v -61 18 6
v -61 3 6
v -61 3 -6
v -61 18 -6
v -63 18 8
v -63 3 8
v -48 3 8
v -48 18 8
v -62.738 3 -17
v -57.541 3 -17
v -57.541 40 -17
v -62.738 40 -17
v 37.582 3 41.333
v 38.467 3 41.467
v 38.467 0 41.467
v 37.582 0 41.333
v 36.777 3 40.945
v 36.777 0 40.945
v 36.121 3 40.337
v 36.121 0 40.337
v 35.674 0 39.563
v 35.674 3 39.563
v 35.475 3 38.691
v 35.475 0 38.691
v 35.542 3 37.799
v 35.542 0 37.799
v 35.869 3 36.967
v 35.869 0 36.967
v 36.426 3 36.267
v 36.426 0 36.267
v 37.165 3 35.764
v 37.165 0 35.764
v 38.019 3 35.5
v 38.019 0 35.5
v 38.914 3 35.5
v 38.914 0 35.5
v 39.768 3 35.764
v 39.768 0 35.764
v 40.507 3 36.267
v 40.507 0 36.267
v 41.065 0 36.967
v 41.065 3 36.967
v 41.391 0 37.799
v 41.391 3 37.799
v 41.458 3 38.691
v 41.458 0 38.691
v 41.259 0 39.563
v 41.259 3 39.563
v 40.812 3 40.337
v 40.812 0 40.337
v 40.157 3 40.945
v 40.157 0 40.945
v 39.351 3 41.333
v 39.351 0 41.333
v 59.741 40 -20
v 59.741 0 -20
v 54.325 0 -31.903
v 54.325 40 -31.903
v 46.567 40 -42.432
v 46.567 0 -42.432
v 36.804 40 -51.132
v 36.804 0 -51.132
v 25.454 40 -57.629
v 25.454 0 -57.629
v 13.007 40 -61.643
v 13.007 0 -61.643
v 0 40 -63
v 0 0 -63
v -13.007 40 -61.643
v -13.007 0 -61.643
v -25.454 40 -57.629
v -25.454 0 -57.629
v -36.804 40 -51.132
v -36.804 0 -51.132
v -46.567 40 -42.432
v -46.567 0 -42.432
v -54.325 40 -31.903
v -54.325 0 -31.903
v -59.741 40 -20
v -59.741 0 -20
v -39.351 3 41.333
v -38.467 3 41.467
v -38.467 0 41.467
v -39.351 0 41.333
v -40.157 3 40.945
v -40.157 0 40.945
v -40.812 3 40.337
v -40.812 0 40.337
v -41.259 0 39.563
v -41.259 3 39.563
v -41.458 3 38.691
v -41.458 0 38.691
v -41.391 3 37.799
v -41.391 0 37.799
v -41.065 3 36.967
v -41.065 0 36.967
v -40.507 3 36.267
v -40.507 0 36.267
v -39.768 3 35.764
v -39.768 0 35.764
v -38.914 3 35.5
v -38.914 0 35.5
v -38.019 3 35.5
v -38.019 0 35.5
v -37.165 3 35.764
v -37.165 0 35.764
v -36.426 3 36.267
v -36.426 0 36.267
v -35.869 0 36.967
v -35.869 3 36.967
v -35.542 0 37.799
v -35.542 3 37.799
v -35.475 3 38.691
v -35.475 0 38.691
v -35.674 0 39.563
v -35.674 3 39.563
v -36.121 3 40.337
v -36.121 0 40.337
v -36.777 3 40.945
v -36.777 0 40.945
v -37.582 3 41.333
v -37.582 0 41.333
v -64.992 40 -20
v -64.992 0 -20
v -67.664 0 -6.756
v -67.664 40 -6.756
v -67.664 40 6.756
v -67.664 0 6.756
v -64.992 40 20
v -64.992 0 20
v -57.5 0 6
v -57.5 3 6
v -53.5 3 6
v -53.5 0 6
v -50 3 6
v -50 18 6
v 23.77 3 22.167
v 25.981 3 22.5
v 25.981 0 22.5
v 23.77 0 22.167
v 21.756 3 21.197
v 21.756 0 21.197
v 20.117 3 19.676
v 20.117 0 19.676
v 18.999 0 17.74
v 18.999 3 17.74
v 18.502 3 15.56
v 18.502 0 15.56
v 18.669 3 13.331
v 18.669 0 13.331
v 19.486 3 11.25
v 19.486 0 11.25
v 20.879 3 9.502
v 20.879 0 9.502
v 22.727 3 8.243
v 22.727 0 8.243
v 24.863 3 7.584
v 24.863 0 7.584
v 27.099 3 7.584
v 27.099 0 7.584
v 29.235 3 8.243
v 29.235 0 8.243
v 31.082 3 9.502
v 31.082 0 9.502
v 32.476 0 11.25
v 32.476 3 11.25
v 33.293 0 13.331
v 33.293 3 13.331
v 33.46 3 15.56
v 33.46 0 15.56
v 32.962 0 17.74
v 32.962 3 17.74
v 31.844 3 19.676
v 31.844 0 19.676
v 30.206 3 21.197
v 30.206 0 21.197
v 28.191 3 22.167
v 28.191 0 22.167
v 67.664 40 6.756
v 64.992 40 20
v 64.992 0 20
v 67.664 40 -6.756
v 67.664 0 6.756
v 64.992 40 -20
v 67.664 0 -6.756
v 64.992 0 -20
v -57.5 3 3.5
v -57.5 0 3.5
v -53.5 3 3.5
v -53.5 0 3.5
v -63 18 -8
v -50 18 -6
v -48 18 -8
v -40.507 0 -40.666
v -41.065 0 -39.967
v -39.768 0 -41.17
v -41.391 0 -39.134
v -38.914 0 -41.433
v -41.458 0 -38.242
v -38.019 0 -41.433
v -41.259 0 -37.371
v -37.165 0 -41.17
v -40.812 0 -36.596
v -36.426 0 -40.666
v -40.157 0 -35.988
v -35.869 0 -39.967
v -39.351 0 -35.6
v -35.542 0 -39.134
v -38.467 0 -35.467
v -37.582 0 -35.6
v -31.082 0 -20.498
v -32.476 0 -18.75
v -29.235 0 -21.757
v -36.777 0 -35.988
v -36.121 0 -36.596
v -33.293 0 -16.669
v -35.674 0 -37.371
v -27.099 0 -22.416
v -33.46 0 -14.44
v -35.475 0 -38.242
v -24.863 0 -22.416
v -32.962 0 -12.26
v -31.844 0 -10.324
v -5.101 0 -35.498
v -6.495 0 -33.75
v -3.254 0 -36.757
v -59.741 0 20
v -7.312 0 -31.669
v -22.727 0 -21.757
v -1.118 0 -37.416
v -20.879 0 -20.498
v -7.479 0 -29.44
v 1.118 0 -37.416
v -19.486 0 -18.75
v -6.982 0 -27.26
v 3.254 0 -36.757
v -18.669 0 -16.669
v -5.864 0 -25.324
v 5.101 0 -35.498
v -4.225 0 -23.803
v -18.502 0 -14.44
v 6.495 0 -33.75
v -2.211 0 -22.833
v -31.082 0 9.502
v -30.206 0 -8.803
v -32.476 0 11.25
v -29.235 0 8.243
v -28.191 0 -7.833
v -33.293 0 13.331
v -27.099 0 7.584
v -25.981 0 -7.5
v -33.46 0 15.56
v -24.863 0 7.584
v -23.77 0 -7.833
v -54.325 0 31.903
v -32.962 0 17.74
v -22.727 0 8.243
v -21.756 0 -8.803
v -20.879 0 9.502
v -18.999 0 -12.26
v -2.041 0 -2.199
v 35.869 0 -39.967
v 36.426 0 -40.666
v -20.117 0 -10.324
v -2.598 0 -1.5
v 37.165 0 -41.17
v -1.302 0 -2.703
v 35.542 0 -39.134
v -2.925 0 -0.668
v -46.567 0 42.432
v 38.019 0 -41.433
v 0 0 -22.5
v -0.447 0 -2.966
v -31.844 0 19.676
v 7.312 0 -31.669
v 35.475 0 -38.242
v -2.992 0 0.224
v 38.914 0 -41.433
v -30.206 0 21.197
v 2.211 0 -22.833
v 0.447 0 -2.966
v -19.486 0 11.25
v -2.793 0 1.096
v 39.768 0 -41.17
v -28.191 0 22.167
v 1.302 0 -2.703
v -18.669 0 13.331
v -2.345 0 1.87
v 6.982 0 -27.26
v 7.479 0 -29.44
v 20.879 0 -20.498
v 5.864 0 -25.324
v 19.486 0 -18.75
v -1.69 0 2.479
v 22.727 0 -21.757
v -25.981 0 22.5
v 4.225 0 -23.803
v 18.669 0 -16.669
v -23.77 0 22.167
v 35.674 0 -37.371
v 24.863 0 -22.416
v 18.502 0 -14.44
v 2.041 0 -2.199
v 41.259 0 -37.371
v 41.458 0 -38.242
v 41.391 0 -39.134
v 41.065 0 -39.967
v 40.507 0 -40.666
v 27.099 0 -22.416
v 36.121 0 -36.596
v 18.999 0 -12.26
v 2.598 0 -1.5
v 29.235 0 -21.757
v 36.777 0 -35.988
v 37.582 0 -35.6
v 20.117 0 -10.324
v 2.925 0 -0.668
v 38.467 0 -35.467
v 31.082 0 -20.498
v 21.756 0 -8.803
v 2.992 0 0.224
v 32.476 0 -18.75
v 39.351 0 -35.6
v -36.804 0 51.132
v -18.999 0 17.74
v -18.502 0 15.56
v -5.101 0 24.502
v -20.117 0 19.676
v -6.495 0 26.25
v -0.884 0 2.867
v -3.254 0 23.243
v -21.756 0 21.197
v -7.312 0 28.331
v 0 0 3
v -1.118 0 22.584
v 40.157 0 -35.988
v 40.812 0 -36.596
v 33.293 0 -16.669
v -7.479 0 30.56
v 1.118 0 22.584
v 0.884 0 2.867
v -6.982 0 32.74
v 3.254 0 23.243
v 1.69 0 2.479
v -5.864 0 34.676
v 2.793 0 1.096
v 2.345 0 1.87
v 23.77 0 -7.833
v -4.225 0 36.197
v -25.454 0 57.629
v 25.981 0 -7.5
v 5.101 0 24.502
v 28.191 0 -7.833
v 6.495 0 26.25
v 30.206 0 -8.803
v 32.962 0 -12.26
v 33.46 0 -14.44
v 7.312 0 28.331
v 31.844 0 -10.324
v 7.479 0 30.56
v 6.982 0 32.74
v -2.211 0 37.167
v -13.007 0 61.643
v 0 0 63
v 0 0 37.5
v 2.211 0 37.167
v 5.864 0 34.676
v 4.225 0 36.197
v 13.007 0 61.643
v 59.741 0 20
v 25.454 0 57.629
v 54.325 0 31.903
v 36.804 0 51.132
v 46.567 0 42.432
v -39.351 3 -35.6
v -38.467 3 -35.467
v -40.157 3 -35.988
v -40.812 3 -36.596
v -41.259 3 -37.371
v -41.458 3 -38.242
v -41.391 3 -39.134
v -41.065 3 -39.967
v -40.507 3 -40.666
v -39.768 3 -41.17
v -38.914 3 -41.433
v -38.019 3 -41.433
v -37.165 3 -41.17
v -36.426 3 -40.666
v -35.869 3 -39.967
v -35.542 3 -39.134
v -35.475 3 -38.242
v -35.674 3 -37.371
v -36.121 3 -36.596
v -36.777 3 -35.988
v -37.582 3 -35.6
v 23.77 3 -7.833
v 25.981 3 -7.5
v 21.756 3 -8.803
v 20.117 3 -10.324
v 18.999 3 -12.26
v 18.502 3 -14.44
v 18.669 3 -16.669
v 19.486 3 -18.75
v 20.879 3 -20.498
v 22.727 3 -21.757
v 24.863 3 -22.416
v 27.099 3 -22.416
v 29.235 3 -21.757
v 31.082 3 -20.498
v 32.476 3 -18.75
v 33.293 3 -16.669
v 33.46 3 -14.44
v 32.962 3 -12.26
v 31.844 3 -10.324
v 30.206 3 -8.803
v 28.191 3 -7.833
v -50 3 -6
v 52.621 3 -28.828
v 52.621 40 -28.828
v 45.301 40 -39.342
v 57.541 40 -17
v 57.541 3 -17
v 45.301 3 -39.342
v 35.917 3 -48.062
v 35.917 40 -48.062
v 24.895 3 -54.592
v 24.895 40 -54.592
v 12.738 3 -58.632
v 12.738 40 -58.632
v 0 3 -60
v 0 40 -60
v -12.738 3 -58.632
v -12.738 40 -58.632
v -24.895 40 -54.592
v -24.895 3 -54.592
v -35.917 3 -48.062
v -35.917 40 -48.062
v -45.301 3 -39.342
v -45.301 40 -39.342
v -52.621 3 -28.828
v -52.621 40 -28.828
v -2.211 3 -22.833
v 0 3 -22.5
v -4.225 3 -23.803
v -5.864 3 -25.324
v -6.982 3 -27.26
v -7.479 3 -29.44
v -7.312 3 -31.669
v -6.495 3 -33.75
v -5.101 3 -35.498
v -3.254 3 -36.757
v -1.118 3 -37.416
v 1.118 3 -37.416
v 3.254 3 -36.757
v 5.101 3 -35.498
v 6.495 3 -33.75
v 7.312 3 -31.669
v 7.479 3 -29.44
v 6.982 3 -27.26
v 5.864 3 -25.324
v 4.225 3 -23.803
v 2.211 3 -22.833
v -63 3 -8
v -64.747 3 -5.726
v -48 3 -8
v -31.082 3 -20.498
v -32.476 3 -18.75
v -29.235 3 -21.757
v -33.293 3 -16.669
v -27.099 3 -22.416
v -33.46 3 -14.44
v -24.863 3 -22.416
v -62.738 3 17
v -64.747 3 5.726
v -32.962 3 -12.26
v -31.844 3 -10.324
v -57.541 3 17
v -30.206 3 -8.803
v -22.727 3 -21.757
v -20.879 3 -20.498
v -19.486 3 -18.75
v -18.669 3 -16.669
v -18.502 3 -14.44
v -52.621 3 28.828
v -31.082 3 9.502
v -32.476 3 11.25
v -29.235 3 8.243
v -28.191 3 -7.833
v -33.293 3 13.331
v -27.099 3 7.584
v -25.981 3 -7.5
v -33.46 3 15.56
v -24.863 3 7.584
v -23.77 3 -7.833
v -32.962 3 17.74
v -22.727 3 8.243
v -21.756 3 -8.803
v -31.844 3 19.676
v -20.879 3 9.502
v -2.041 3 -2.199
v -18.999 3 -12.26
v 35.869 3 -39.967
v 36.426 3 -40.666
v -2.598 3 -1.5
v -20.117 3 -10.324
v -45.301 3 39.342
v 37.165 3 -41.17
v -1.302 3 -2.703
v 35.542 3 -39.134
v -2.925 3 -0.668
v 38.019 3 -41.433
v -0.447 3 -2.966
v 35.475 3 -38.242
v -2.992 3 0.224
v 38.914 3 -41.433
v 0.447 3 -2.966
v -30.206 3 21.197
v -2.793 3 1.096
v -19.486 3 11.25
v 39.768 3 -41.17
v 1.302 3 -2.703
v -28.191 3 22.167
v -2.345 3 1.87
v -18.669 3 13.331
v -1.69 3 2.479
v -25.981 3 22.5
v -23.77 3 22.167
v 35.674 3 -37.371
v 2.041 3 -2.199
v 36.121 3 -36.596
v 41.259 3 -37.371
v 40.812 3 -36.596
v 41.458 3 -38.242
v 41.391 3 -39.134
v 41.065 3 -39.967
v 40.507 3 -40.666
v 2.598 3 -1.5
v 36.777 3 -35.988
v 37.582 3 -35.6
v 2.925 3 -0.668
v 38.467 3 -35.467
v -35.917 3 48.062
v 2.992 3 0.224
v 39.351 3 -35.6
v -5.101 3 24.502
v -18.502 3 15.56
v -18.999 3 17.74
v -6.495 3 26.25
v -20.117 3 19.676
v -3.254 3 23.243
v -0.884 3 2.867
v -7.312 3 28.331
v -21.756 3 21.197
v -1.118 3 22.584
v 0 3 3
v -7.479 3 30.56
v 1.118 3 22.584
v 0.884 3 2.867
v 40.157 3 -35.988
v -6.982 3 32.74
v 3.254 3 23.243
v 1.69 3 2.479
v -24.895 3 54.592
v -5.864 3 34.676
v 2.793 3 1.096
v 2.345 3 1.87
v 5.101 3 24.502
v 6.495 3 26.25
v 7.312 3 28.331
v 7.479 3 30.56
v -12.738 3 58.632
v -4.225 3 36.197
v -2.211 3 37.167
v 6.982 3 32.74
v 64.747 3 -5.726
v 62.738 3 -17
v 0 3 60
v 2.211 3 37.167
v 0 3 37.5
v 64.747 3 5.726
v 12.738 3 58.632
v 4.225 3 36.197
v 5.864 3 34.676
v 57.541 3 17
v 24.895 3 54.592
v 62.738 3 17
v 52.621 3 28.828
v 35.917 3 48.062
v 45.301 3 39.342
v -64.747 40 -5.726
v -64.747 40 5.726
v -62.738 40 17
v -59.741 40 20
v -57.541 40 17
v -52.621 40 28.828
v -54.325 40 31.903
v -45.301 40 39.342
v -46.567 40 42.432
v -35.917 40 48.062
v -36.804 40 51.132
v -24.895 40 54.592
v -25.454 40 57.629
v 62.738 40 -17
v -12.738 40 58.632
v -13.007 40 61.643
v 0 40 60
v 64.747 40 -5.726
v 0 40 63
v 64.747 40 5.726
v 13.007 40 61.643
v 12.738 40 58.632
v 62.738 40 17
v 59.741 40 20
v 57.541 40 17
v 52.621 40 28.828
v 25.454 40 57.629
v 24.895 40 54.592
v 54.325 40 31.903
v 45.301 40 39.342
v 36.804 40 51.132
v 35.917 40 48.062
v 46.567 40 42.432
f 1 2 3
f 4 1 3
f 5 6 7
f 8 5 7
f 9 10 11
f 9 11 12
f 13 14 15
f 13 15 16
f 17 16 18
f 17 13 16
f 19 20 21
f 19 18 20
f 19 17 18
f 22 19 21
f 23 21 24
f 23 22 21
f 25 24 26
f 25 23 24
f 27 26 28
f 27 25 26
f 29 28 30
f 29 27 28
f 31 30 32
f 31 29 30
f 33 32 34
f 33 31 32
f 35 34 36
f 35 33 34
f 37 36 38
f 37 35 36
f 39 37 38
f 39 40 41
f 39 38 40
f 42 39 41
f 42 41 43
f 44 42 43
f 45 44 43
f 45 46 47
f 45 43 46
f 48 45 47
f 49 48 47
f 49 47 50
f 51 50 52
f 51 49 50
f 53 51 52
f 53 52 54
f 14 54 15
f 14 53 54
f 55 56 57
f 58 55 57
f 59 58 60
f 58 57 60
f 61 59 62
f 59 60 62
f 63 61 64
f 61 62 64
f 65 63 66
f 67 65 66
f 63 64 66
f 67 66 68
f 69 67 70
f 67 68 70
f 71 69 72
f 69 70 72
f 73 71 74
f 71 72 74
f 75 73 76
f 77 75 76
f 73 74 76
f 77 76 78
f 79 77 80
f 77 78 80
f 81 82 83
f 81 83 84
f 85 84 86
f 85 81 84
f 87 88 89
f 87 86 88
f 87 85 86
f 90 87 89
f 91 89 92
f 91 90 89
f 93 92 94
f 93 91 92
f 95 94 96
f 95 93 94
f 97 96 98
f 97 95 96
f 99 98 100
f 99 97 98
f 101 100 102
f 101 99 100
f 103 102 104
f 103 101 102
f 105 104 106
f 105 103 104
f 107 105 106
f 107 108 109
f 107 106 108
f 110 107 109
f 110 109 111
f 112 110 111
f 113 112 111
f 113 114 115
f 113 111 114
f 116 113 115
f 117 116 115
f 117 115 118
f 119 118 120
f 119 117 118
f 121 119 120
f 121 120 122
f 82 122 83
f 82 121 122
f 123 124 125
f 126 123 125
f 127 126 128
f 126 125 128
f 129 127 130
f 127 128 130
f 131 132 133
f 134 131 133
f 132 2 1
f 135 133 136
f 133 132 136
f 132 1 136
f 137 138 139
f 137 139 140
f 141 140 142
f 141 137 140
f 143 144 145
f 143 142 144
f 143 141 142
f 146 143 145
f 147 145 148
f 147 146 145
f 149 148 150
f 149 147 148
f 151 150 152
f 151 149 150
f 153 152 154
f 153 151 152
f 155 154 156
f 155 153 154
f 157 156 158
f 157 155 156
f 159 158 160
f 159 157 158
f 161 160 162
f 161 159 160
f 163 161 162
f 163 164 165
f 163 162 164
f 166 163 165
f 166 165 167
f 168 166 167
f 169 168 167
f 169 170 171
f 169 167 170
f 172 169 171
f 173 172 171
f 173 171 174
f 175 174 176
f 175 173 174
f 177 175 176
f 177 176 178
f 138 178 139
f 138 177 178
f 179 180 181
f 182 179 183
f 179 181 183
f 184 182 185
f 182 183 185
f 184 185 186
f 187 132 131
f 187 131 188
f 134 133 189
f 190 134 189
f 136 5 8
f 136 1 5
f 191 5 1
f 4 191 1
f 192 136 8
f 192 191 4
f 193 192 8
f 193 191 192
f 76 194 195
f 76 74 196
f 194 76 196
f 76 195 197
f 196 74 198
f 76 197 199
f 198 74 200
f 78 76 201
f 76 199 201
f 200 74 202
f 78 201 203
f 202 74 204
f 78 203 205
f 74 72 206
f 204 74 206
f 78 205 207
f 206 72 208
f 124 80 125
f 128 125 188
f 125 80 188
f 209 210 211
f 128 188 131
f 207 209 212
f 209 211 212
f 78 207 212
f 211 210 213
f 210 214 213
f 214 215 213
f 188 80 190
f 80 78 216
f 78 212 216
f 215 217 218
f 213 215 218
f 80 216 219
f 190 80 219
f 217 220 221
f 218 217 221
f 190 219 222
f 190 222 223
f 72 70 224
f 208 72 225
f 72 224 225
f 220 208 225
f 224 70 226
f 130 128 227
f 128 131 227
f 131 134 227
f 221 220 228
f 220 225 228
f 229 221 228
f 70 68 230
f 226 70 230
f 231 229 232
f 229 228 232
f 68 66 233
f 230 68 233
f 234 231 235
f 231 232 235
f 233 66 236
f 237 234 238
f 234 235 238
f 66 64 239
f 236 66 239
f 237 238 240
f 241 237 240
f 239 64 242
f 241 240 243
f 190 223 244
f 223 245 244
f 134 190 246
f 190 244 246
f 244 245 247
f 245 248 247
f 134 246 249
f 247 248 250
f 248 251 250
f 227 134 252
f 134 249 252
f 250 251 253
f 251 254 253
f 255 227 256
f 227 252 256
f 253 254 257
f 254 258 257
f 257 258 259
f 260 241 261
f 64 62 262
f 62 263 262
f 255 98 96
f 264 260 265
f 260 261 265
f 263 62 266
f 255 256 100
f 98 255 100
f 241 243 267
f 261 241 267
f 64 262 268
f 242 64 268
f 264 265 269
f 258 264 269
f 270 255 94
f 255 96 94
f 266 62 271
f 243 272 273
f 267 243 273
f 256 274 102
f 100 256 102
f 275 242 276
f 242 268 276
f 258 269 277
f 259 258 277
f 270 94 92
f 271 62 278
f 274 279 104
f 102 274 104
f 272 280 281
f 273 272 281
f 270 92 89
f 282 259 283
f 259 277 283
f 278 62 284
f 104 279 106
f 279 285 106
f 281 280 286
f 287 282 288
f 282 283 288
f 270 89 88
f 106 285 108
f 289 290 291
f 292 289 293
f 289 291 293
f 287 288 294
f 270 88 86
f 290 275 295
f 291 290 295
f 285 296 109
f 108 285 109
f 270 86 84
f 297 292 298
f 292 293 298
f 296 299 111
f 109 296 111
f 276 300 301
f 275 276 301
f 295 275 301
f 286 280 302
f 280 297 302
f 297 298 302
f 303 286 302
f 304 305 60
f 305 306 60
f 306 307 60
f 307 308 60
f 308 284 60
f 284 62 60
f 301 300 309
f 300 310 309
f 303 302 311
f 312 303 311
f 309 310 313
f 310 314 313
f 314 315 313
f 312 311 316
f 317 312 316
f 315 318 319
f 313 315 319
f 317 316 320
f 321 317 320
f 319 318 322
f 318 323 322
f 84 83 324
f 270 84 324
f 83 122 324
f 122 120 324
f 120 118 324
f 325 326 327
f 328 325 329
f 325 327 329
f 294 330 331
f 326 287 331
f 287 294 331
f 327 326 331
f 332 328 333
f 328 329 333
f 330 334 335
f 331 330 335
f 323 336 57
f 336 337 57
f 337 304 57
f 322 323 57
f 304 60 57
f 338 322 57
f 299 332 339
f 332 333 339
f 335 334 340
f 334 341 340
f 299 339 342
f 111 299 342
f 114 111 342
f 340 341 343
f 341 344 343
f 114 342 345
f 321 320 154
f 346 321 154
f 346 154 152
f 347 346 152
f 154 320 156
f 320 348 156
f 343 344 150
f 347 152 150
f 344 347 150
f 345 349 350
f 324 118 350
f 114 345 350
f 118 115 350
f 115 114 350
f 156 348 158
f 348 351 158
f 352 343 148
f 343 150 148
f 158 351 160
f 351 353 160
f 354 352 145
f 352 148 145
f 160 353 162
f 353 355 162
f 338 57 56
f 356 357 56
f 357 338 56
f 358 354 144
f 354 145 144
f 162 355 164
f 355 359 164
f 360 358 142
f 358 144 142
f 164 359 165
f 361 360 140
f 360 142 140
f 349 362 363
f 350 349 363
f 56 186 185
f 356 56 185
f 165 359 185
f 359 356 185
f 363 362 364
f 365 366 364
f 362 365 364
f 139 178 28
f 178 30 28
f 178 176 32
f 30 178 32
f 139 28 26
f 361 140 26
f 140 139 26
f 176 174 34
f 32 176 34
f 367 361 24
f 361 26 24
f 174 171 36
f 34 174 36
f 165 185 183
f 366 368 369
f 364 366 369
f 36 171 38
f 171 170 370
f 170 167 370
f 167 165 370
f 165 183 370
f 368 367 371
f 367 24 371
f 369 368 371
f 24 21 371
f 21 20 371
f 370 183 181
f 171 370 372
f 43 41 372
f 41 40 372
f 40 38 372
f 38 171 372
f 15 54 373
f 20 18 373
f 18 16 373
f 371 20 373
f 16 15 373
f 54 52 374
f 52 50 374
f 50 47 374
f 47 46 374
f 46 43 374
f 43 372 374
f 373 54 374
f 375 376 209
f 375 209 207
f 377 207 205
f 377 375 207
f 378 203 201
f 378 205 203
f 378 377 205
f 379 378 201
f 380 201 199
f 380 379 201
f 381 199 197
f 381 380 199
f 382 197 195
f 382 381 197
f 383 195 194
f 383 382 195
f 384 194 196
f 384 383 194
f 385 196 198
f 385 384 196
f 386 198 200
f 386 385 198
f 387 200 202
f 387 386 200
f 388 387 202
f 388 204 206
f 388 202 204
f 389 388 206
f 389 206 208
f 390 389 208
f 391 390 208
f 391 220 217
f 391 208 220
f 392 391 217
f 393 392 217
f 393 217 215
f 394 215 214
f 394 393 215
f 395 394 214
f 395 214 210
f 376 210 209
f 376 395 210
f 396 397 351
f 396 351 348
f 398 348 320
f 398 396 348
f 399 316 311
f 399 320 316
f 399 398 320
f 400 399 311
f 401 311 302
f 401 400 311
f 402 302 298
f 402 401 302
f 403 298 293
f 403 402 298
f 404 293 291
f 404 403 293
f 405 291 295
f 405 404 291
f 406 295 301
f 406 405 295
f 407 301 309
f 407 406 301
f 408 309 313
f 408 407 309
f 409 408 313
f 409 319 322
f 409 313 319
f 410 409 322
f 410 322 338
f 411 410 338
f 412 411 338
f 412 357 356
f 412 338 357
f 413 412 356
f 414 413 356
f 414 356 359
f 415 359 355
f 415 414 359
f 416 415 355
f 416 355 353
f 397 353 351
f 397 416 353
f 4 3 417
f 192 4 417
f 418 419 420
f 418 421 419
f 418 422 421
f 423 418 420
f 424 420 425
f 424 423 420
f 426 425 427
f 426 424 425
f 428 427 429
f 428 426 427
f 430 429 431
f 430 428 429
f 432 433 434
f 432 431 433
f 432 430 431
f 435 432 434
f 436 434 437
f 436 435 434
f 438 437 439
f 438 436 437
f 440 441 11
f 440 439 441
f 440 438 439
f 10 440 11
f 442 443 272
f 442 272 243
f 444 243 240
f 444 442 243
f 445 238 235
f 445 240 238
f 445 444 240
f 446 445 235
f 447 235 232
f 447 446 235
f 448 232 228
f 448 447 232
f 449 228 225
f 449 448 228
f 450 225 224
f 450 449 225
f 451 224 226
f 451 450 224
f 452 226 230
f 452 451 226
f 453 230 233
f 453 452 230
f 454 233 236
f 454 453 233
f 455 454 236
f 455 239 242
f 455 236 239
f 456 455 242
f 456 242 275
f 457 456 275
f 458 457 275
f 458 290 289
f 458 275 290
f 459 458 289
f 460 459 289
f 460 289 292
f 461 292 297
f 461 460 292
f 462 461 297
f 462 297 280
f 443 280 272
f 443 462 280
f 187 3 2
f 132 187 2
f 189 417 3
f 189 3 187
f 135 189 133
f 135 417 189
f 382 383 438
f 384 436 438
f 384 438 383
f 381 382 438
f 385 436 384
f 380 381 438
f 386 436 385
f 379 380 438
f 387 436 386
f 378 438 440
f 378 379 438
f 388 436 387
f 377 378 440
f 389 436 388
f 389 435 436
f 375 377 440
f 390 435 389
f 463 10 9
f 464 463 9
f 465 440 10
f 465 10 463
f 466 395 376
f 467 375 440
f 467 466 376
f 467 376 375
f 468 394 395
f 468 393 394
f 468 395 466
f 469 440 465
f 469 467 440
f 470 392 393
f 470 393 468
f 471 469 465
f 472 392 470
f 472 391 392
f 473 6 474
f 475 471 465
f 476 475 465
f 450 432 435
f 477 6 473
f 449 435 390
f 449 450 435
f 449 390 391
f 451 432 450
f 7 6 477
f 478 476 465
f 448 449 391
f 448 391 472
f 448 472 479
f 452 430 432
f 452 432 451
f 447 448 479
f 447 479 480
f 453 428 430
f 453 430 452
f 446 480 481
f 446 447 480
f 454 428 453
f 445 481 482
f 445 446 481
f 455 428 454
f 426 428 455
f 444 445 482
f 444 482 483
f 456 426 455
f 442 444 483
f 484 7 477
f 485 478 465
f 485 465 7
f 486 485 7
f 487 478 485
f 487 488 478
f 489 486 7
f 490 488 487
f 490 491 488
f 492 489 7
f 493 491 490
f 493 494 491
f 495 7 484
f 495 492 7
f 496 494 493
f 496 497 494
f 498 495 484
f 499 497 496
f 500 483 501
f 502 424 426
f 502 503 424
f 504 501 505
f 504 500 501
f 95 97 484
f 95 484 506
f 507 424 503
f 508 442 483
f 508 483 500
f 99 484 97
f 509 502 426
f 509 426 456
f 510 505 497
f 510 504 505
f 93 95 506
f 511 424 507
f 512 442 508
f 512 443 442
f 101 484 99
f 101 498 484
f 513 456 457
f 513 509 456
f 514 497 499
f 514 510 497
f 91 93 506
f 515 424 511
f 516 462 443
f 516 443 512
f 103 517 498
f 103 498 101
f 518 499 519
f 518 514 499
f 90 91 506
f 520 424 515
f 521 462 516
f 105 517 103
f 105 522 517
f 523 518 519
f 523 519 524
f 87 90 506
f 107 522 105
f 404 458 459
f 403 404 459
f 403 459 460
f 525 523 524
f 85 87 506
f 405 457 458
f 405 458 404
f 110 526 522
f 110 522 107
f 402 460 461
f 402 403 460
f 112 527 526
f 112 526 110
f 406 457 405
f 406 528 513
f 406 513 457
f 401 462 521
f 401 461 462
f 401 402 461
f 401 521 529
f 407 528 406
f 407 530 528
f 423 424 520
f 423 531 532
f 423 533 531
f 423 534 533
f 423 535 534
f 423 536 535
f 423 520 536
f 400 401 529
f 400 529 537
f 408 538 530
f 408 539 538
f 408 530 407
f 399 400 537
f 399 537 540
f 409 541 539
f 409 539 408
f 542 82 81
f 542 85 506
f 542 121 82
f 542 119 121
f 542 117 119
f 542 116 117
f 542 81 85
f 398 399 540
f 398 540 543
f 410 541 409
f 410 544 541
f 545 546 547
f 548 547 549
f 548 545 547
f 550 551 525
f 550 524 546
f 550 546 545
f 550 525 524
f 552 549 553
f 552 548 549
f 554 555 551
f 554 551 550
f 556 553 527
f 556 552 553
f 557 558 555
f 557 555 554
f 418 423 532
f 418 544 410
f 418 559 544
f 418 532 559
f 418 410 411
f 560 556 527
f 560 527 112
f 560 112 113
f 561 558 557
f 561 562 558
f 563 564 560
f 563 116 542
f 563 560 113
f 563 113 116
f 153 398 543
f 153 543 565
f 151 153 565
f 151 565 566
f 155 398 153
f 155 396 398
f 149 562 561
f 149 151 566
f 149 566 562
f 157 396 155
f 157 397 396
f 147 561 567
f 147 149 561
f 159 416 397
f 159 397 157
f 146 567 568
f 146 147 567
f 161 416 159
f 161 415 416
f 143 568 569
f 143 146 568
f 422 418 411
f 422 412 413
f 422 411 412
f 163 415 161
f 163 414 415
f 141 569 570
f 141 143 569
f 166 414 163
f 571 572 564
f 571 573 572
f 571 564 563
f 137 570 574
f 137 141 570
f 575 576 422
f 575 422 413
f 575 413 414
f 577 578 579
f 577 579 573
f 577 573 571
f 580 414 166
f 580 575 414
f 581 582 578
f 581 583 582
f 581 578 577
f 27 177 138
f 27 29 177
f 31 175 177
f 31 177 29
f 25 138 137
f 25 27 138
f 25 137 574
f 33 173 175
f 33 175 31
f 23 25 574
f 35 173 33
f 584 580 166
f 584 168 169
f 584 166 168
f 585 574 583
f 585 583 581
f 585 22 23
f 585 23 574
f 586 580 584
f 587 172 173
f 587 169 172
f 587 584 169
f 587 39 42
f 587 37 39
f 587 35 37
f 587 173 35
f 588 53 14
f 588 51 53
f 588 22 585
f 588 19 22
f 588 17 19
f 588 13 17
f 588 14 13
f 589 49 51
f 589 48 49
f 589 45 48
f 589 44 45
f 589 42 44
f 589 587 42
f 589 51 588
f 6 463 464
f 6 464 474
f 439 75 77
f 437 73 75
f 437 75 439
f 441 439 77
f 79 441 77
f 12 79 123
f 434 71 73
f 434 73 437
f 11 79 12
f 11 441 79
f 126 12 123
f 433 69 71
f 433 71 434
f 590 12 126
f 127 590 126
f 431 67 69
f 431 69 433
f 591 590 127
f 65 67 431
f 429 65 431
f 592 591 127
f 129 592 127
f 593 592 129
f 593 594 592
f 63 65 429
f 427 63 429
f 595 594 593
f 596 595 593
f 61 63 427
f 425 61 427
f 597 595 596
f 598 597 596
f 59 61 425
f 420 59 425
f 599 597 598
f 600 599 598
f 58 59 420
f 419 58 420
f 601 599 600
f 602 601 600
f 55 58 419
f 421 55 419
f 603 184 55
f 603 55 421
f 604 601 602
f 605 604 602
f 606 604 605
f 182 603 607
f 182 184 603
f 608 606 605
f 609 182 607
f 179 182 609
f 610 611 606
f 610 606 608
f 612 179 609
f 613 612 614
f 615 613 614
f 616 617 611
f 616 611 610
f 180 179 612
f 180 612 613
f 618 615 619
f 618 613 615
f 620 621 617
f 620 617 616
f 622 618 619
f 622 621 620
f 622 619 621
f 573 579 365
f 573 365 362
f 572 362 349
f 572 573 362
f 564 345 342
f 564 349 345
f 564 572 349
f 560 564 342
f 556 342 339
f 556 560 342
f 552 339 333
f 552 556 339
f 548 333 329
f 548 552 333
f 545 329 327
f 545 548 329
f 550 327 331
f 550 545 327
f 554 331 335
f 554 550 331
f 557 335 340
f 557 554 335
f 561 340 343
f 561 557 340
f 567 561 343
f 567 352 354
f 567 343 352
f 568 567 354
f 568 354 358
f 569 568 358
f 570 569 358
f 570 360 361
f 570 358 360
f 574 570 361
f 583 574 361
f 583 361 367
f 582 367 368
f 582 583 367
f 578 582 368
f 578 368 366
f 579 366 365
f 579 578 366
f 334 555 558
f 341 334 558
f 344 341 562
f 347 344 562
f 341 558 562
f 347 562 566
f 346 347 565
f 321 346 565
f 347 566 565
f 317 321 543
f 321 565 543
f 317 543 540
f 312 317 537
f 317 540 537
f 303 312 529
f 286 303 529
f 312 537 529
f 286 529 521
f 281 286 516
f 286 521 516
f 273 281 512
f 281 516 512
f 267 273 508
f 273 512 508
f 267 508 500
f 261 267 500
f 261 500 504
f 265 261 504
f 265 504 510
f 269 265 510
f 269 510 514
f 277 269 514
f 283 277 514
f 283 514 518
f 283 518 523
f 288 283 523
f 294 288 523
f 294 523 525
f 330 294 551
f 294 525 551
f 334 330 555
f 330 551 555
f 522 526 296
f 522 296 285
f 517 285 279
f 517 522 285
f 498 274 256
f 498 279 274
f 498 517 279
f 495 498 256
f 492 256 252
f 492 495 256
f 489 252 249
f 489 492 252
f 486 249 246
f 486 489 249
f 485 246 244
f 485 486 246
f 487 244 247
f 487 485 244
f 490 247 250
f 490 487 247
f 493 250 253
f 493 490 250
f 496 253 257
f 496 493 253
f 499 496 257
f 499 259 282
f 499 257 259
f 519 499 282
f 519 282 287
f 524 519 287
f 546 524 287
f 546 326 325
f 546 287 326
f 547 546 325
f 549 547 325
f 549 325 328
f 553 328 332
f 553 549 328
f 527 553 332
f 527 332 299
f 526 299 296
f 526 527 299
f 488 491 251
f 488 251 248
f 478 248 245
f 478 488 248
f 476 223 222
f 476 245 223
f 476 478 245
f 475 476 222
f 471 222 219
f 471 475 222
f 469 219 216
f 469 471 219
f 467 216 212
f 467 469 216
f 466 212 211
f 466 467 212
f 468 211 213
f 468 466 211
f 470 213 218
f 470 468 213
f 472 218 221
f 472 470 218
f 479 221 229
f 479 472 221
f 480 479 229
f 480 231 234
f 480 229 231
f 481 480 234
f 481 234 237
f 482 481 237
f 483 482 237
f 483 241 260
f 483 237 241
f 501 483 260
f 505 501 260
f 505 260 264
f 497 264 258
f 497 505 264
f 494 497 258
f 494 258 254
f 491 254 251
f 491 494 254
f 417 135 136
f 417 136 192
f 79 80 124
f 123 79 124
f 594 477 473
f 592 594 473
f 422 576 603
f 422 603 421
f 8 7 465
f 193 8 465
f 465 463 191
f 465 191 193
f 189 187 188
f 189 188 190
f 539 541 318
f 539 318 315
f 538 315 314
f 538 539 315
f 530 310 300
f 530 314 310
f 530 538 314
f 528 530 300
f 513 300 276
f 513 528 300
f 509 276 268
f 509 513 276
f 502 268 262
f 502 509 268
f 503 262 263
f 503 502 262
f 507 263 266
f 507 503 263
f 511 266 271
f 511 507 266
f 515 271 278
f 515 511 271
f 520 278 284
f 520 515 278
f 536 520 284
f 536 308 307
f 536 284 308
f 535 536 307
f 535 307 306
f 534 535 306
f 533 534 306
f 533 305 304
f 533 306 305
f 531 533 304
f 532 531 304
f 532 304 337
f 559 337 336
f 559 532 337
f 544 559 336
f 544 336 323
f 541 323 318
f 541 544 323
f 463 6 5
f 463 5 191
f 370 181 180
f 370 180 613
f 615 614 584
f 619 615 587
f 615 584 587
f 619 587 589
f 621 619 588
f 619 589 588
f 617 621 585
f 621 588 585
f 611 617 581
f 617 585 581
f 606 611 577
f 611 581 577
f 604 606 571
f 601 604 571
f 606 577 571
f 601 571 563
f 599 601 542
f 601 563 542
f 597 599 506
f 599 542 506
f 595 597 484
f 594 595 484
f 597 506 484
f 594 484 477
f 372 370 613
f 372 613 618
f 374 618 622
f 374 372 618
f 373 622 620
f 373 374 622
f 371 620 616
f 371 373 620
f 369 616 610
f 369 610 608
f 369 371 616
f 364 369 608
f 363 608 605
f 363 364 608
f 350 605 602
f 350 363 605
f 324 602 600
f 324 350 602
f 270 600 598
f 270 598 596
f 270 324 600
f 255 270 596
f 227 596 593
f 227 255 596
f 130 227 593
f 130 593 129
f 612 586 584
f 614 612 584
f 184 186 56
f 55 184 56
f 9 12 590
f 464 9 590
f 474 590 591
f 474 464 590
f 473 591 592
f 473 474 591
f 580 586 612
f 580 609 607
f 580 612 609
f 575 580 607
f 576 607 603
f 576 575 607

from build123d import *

# Parameters (mm, degrees)
SKETCH1_R               = 68
BOSS_EXTRUDE1_DEPTH     = 40
CUT_EXTRUDE1_START      = -40
CUT_EXTRUDE1_DEPTH      = 40
SHELL1_T                = -3
CUT_EXTRUDE2_DEPTH      = 101.960388272
CUT_EXTRUDE2_DEPTH_BACK = 101.960388272
SKETCH3_R               = 3
SKETCH3_R_2             = 7.5
SKETCH4_R               = 3
CUT_EXTRUDE3_DEPTH      = 3
SKETCH6_W               = 15
SKETCH6_H               = 16
SKETCH6_W_2             = 11
SKETCH6_H_2             = 12
BOSS_EXTRUDE2_DEPTH     = 15
SKETCH7_W               = 4
SKETCH7_H               = 2.5
CUT_EXTRUDE5_DEPTH      = 3


with BuildPart() as part:
    # Sketch1 → Boss-Extrude1 (new body)
    with BuildSketch(Plane(origin=(0, 0, 0), x_dir=(1, 0, 0), z_dir=(0, 1, 0))):
        with Locations(Location((0, 0, 0), (0, 0, 270))):
            Circle(SKETCH1_R)
    extrude(amount=BOSS_EXTRUDE1_DEPTH)

    # Sketch2 → Cut-Extrude1 (cut)
    with BuildSketch(Plane(origin=(0, 40, 0), x_dir=(1, 0, 0), z_dir=(0, 1, 0)).offset(CUT_EXTRUDE1_START)):
        with BuildLine():
            Line((-59.741108125, -20), (-64.992307237, -20))
            ThreePointArc((-64.992307237, -20), (0, -68), (64.992307237, -20))
            Line((64.992307237, -20), (59.741108125, -20))
            ThreePointArc((59.741108125, -20), (0, -63), (-59.741108125, -20))
        make_face()
        with BuildLine():
            Line((-59.741108125, 20), (-64.992307237, 20))
            ThreePointArc((-64.992307237, 20), (0, 68), (64.992307237, 20))
            Line((64.992307237, 20), (59.741108125, 20))
            ThreePointArc((59.741108125, 20), (0, 63), (-59.741108125, 20))
        make_face()
    extrude(amount=CUT_EXTRUDE1_DEPTH, mode=Mode.SUBTRACT)

    # Shell1
    shell1_openings = [part.faces().sort_by_distance(p)[0] for p in [
        (0, 40, 0),
    ]]
    offset(amount=SHELL1_T, openings=shell1_openings, kind=Kind.INTERSECTION)

    # Sketch3 → Cut-Extrude2 (cut, two sides: drawn at the far end of the back side and taken through both)
    with BuildSketch(Plane.XZ.offset(-CUT_EXTRUDE2_DEPTH_BACK)):
        with Locations(Location((-38.466608897, 38.466608897, 0), (0, 0, 90))):
            Circle(SKETCH3_R)
        with Locations(Location((38.466608897, -38.466608897, 0), (0, 0, 90))):
            Circle(SKETCH3_R)
        with Locations(Location((0, 30, 0), (0, 0, 90))):
            Circle(SKETCH3_R_2)
        with Locations(Location((25.980762114, 15, 0), (0, 0, 90))):
            Circle(SKETCH3_R_2)
        with Locations(Location((25.980762114, -15, 0), (0, 0, 90))):
            Circle(SKETCH3_R_2)
        with Locations(Location((0, -30, 0), (0, 0, 90))):
            Circle(SKETCH3_R_2)
        with Locations(Location((-25.980762114, -15, 0), (0, 0, 90))):
            Circle(SKETCH3_R_2)
        with Locations(Location((-25.980762114, 15, 0), (0, 0, 90))):
            Circle(SKETCH3_R_2)
        with Locations(Location((-38.466608897, -38.466608897, 0), (0, 0, 90))):
            Circle(SKETCH3_R)
        with Locations(Location((38.466608897, 38.466608897, 0), (0, 0, 90))):
            Circle(SKETCH3_R)
    extrude(amount=CUT_EXTRUDE2_DEPTH + CUT_EXTRUDE2_DEPTH_BACK, mode=Mode.SUBTRACT)

    # Sketch4 → Cut-Extrude3 (cut)
    with BuildSketch(Plane(origin=(0, 3, 0), x_dir=(1, 0, 0), z_dir=(0, 1, 0))):
        with Locations(Location((0, 0, 0), (0, 0, 270))):
            Circle(SKETCH4_R)
    extrude(amount=-CUT_EXTRUDE3_DEPTH, mode=Mode.SUBTRACT)

    # Sketch6 → Boss-Extrude2 (add)
    with BuildSketch(Plane(origin=(0, 3, 0), x_dir=(1, 0, 0), z_dir=(0, 1, 0))):
        with Locations((-55.5, 0)):
            Rectangle(SKETCH6_W, SKETCH6_H)
        with Locations((-55.5, 0)):
            Rectangle(SKETCH6_W_2, SKETCH6_H_2, mode=Mode.SUBTRACT)
    extrude(amount=BOSS_EXTRUDE2_DEPTH)

    # Sketch7 → Cut-Extrude5 (cut)
    with BuildSketch(Plane(origin=(0, 3, 0), x_dir=(1, 0, 0), z_dir=(0, 1, 0))):
        with Locations((-55.5, -4.75)):
            Rectangle(SKETCH7_W, SKETCH7_H)
    extrude(amount=-CUT_EXTRUDE5_DEPTH, mode=Mode.SUBTRACT)


solid = part.part
